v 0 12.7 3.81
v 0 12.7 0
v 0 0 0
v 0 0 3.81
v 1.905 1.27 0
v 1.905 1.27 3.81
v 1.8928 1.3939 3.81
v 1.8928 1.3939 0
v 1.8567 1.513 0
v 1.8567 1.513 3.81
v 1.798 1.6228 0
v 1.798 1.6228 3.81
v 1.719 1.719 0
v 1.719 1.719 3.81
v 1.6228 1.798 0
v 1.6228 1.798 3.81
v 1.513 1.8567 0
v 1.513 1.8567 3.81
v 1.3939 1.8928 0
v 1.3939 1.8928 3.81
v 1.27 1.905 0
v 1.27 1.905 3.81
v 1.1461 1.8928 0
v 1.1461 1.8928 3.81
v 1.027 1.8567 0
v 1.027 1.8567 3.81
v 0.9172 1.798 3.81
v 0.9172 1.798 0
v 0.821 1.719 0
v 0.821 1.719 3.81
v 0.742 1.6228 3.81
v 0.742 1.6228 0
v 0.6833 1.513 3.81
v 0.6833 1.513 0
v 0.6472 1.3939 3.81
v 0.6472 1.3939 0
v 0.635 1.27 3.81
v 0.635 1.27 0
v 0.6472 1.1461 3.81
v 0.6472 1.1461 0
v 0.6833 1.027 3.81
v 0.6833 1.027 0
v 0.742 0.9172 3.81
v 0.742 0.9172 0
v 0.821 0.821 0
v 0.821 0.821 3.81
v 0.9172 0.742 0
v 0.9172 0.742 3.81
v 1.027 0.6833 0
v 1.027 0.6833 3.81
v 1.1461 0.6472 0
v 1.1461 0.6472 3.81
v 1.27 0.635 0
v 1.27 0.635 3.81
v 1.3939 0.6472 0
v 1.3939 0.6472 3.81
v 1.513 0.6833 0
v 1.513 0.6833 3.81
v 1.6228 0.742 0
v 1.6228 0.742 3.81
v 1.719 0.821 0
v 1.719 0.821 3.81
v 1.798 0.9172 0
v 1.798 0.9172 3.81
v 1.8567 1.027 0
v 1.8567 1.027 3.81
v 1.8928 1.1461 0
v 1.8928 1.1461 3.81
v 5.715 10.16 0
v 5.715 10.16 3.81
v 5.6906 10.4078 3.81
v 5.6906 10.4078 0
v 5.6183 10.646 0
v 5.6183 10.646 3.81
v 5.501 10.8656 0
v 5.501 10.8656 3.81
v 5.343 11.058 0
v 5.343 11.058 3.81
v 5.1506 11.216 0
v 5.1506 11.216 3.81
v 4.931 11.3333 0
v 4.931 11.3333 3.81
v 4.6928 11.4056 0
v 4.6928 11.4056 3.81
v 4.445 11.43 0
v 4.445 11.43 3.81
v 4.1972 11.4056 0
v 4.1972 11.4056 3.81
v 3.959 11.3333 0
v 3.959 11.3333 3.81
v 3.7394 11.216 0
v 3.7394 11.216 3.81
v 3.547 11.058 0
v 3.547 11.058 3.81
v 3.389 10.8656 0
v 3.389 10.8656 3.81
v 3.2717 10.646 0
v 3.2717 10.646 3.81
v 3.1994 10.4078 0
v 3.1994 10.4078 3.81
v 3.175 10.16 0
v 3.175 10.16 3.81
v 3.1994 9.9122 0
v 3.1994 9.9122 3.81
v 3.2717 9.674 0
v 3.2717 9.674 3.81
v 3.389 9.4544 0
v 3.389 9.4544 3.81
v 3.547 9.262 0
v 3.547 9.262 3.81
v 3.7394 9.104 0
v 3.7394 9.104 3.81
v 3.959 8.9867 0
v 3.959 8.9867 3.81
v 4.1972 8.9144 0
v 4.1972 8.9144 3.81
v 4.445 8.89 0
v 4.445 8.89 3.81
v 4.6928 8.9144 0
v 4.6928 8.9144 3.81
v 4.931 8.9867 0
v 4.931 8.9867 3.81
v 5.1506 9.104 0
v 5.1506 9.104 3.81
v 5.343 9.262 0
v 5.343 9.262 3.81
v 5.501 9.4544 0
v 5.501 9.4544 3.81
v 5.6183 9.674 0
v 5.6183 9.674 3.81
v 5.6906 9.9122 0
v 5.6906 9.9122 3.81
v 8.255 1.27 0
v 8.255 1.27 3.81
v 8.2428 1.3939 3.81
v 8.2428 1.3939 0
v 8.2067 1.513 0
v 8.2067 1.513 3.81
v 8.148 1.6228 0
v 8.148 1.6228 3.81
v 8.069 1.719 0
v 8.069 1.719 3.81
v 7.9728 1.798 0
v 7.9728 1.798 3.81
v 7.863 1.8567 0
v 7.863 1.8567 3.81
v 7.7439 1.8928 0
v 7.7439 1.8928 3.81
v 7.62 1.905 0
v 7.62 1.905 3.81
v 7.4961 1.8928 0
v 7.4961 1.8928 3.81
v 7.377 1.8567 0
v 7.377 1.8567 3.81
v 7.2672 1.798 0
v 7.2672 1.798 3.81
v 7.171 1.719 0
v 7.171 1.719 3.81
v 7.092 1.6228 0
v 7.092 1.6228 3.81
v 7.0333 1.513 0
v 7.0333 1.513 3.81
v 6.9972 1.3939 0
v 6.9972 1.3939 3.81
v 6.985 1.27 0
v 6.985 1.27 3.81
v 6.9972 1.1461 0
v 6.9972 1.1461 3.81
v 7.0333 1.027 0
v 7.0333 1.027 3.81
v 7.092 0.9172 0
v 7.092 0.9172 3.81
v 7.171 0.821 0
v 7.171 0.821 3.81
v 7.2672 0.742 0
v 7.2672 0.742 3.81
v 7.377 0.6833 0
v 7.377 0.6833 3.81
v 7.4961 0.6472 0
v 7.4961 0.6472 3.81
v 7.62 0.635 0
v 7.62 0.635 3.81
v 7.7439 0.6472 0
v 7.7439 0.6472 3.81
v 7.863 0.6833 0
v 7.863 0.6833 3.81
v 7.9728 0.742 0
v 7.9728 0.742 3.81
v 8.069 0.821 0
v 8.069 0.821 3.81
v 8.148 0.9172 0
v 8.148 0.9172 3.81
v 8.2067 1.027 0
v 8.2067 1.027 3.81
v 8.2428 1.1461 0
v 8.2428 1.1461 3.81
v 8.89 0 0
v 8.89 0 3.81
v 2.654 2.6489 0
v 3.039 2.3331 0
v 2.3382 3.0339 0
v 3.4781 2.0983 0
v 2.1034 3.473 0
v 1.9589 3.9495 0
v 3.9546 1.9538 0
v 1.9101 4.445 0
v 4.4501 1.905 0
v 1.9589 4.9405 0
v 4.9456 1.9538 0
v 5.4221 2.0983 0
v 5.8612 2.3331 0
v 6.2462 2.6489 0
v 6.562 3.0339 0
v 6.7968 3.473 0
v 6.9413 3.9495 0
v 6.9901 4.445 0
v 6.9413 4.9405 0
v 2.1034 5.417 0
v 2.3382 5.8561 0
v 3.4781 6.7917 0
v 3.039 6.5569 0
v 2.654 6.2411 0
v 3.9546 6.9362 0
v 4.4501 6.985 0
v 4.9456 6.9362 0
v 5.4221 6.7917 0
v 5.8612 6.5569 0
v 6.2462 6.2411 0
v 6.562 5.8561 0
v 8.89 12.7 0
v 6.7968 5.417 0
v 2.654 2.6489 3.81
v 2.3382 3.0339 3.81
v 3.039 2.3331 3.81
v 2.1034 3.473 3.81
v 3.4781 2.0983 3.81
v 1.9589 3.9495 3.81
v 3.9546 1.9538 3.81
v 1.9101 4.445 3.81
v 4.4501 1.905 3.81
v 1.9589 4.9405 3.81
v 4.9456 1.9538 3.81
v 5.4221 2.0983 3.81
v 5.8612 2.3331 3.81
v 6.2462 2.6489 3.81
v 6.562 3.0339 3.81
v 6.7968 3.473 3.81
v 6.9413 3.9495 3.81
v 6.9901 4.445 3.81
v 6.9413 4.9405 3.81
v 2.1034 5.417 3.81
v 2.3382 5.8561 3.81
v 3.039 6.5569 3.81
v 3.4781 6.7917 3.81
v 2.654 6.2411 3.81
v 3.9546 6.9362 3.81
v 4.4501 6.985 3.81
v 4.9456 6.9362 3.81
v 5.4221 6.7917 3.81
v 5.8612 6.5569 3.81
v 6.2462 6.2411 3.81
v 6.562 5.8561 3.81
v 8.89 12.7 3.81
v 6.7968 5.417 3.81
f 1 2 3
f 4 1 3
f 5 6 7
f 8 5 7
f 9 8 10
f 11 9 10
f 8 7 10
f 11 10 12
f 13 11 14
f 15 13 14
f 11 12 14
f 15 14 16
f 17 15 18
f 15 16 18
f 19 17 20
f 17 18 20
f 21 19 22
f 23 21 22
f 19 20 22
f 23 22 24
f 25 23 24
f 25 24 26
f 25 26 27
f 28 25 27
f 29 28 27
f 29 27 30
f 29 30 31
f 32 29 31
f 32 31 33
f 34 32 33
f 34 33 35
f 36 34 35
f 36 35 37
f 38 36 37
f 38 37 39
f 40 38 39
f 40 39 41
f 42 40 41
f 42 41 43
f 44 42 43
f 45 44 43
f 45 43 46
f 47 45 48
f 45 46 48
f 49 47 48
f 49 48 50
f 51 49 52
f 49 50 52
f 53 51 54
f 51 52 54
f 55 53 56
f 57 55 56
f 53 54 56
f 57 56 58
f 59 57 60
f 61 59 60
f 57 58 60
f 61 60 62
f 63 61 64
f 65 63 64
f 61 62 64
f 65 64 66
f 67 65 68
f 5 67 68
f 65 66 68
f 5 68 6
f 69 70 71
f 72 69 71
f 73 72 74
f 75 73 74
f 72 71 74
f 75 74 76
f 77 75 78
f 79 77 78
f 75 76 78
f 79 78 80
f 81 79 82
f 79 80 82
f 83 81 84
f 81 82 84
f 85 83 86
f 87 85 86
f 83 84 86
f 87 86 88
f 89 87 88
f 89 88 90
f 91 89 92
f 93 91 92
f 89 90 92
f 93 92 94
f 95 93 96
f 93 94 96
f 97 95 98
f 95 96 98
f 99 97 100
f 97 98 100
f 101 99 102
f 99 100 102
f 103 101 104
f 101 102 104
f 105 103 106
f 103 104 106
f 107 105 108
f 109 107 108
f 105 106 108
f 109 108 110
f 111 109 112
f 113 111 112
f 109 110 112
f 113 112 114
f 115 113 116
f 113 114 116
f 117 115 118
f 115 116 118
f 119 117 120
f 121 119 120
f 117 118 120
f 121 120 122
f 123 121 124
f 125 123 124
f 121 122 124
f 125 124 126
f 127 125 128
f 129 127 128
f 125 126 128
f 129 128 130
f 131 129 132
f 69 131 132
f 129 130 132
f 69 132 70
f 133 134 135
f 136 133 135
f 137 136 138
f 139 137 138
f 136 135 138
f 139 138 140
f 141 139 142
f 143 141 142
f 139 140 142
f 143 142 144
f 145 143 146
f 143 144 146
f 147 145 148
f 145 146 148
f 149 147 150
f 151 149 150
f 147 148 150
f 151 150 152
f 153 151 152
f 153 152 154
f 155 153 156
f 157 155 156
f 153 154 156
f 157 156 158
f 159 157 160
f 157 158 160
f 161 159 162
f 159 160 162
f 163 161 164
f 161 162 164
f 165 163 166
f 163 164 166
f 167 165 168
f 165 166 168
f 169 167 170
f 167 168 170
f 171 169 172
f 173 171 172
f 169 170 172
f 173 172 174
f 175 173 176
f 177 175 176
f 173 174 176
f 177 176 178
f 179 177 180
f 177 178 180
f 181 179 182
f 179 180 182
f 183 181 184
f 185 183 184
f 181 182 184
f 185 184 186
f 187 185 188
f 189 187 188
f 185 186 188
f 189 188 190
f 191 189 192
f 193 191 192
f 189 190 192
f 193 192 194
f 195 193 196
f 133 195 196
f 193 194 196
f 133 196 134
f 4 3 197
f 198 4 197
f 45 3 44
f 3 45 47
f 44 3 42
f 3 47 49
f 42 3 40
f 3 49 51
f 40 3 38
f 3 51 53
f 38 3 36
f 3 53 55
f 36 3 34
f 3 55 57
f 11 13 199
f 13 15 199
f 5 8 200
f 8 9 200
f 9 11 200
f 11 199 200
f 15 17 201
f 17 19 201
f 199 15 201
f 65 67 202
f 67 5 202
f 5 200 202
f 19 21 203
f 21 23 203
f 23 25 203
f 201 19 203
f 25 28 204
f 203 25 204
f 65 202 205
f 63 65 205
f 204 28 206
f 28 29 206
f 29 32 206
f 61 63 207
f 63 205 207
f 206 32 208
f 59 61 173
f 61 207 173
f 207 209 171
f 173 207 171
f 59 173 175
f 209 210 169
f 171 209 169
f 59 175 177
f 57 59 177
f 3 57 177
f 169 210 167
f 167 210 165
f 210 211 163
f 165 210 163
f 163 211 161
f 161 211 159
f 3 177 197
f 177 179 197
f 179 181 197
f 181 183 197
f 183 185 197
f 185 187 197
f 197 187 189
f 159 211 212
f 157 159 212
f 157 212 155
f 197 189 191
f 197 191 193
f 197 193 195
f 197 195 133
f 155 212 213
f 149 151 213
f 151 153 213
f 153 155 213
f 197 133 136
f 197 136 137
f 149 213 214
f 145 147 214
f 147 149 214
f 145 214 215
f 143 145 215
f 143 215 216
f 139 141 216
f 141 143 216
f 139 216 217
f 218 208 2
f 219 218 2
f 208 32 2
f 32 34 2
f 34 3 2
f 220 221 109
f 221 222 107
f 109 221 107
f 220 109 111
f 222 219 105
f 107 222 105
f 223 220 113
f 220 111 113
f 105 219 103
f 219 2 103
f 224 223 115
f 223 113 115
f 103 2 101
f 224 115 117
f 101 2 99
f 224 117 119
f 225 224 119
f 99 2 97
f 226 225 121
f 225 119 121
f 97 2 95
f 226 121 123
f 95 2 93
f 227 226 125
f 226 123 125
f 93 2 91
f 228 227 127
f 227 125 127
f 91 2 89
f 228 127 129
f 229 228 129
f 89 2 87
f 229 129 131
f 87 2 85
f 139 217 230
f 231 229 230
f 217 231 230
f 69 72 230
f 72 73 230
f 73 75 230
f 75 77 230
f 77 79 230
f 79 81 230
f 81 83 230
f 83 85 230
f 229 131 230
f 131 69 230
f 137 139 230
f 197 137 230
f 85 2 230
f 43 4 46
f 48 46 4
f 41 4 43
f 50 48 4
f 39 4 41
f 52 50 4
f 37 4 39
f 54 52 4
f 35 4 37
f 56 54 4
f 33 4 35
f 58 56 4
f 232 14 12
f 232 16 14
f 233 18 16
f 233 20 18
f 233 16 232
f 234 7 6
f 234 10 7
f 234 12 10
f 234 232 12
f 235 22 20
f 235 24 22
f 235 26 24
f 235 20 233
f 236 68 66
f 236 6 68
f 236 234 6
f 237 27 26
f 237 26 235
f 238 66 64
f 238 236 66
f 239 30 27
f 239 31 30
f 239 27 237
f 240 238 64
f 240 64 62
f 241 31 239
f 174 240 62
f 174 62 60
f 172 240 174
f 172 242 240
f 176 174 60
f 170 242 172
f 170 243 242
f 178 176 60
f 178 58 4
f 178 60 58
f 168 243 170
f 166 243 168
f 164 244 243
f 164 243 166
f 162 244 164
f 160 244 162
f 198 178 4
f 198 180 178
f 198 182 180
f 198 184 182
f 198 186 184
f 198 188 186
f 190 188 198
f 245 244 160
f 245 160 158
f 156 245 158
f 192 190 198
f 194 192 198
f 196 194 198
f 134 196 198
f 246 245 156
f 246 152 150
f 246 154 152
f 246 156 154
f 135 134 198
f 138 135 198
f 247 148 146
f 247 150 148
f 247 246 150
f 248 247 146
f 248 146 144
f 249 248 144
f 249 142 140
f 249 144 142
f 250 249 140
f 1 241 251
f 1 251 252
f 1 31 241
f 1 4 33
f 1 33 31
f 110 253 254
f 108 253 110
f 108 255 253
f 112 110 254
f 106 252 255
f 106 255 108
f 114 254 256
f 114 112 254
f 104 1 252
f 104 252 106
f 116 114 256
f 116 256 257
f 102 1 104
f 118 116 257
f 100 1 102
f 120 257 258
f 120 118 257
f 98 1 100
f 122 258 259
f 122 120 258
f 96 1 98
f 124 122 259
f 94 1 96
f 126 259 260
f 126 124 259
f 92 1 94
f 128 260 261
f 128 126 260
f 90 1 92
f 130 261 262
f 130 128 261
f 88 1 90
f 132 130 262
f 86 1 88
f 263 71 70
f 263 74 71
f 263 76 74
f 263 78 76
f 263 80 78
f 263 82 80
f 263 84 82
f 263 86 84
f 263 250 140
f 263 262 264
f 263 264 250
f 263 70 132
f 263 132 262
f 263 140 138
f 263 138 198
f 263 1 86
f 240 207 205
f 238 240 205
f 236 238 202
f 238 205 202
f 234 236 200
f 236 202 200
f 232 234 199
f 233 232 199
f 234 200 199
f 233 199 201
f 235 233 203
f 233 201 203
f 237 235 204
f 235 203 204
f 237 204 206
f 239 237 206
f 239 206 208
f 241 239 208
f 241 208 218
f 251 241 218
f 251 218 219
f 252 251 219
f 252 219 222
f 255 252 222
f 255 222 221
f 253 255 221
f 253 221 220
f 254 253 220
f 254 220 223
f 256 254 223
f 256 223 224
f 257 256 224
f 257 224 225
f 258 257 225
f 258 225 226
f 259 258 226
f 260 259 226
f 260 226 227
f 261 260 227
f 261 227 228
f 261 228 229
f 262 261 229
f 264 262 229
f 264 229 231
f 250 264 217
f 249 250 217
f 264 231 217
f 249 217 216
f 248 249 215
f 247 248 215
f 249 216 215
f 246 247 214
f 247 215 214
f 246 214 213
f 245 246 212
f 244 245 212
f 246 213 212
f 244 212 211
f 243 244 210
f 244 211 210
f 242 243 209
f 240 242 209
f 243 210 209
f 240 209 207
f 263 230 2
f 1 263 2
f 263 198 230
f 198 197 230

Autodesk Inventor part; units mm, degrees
ref_plane "YZ Plane" through (0, 0, 0) normal (1, 0, 0) x (0, 1, 0)
ref_plane "XZ Plane" through (0, 0, 0) normal (0, 1, 0) x (-1, 0, 0)
ref_plane "XY Plane" through (0, 0, 0) normal (0, 0, 1) x (1, 0, 0)
sketch "Sketch1" plane through (0, 0, 0) normal (0, 0, 1) x (1, 0, 0)
  line L0 (0, 0) -> (8.89, 0)
  line L1 (8.89, 0) -> (8.89, 12.7)
  line L2 (8.89, 12.7) -> (0, 12.7)
  line L3 (0, 12.7) -> (0, 0)
  dimension "d0" = 8.89
  dimension "d1" = 12.7
extrude "Extrusion1" add sketch "Sketch1" along normal blind 3.81
sketch "Sketch2" plane through (0, 0, 3.81) normal (0, 0, 1) x (1, 0, 0)
  circle A0 centre (4.4501, 4.445) radius 3.175
  line L0 (0, 0) -> (8.89, 0) projected
  line L1 (8.89, 0) -> (8.89, 12.7) projected
  dimension "d4" = 6.35
  dimension "d5" = 4.445
  dimension "d6" = 4.4399
hole "Hole1" at (4.4501, 4.445, 3.81) direction (0, 0, -1) diameter 5.08 depth 19.05
sketch "Sketch3" plane through (0, 0, 3.81) normal (0, 0, 1) x (1, 0, 0)
  circle A0 centre (4.445, 10.16) radius 1.27
  line L0 (8.89, 12.7) -> (0, 12.7) projected
  line L1 (8.89, 0) -> (8.89, 12.7) projected
  point P0 (0, 0)
  dimension "d14" = 2.54
  dimension "d15" = 2.54
  dimension "d16" = 4.445
extrude "Extrusion2" cut sketch "Sketch3" against normal blind 25.4
sketch "Sketch4" plane through (0, 0, 3.81) normal (0, 0, 1) x (1, 0, 0)
  circle A0 centre (7.62, 1.27) radius 0.635
  circle A1 centre (1.27, 1.27) radius 0.635
  line L0 (8.89, 0) -> (8.89, 12.7) projected
  line L1 (0, 0) -> (8.89, 0) projected
  line L2 (0, 12.7) -> (0, 0) projected
  dimension "d19" = 1.27
  dimension "d20" = 1.27
  dimension "d21" = 1.27
  dimension "d22" = 1.27
  dimension "d23" = 1.27
  dimension "d24" = 1.27
extrude "Extrusion3" cut sketch "Sketch4" against normal through all
properties part number "EndHole"
